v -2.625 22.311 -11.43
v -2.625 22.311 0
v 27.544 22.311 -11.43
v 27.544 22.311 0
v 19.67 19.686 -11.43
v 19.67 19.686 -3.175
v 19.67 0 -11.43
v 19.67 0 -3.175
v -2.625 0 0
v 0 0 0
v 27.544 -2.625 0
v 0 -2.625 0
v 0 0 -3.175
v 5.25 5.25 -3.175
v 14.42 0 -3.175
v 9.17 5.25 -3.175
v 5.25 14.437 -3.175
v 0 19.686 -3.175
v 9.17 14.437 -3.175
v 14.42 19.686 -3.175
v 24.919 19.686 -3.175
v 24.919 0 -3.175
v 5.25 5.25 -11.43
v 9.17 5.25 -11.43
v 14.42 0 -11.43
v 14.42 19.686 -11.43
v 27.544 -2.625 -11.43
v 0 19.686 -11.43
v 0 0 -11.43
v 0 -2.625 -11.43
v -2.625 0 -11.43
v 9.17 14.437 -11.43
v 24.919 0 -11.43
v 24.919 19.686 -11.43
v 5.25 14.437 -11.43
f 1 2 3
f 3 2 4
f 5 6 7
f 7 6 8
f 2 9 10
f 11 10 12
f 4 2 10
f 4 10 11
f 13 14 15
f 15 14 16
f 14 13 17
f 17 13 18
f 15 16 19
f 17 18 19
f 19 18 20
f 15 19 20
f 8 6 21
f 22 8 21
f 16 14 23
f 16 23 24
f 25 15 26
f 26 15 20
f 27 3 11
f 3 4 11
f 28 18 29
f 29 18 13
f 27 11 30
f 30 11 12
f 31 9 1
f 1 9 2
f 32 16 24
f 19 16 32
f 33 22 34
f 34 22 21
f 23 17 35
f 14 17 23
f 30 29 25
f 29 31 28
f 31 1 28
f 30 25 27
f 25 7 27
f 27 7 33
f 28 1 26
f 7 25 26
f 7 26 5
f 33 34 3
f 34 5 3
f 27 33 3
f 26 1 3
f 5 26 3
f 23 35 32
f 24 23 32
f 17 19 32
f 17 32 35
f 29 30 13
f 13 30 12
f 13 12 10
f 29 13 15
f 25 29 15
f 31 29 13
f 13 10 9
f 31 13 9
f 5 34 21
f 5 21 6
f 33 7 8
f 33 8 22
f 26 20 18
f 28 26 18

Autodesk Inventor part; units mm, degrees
ref_plane "YZ Plane" through (0, 0, 0) normal (1, 0, 0) x (0, 1, 0)
ref_plane "XZ Plane" through (0, 0, 0) normal (0, 1, 0) x (-1, 0, 0)
ref_plane "XY Plane" through (0, 0, 0) normal (0, 0, 1) x (1, 0, 0)
sketch "TopProfile" plane through (0, 0, 0) normal (0, 0, 1) x (1, 0, 0)
  line L0 (0, 19.6865) -> (0, 0)
  line L1 (9.1702, 14.4367) -> (5.2497, 14.4367)
  line L2 (5.2497, 14.4367) -> (5.2497, 5.2497)
  line L3 (5.2497, 5.2497) -> (9.1702, 5.2497)
  line L4 (9.1702, 5.2497) -> (9.1702, 14.4367)
  line L5 (19.6697, 0) -> (24.9194, 0)
  line L6 (24.9194, 0) -> (24.9194, 19.6865)
  line L7 (24.9194, 19.6865) -> (19.6697, 19.6865)
  line L8 (19.6697, 19.6865) -> (19.6697, 0)
  line L9 (-2.6249, 0) -> (-2.6249, 22.3113)
  line L10 (-2.6249, 22.3113) -> (27.5442, 22.3113)
  line L11 (27.5442, 22.3113) -> (27.5442, -2.6249)
  line L12 (27.5442, -2.6249) -> (0, -2.6249)
  line L13 (0, -2.6249) -> (0, 0)
  line L14 (0, 0) -> (-2.6249, 0)
  line L15 (14.4199, 0) -> (14.4199, 19.6865)
  line L16 (14.4199, 19.6865) -> (0, 19.6865)
  line L17 (0, 0) -> (14.4199, 0)
  line L18 (-2.6249, 0) -> (-2.6249, -2.6249)
  line L19 (-2.6249, -2.6249) -> (0, -2.6249)
  dimension "d3" = 3.9205
  dimension "d4" = 5.2497
  dimension "d8" = 5.2497
  dimension "d12" = 5.2497
  dimension "d13" = 2.6249
  dimension "d14" = 5.2497
  dimension "d15" = 5.2497
  dimension "d16" = 2.6249
  dimension "d17" = 2.6249
  dimension "d18" = 2.6249
  dimension "d19" = 24.9362
  dimension "d20" = 27.5443
  dimension "d21" = 5.2497
extrude "NegativeFeature" add sketch "TopProfile" against normal blind 11.43 contours L14 L9 L10 L11 L12 L13 | L4 L3 L2 L1
extrude "PositiveFeature" add sketch "TopProfile" against normal blind 3.175 contours L16 L15 L17 L0 | L8 L7 L6 L5
properties part number "switchback-logo-01"
